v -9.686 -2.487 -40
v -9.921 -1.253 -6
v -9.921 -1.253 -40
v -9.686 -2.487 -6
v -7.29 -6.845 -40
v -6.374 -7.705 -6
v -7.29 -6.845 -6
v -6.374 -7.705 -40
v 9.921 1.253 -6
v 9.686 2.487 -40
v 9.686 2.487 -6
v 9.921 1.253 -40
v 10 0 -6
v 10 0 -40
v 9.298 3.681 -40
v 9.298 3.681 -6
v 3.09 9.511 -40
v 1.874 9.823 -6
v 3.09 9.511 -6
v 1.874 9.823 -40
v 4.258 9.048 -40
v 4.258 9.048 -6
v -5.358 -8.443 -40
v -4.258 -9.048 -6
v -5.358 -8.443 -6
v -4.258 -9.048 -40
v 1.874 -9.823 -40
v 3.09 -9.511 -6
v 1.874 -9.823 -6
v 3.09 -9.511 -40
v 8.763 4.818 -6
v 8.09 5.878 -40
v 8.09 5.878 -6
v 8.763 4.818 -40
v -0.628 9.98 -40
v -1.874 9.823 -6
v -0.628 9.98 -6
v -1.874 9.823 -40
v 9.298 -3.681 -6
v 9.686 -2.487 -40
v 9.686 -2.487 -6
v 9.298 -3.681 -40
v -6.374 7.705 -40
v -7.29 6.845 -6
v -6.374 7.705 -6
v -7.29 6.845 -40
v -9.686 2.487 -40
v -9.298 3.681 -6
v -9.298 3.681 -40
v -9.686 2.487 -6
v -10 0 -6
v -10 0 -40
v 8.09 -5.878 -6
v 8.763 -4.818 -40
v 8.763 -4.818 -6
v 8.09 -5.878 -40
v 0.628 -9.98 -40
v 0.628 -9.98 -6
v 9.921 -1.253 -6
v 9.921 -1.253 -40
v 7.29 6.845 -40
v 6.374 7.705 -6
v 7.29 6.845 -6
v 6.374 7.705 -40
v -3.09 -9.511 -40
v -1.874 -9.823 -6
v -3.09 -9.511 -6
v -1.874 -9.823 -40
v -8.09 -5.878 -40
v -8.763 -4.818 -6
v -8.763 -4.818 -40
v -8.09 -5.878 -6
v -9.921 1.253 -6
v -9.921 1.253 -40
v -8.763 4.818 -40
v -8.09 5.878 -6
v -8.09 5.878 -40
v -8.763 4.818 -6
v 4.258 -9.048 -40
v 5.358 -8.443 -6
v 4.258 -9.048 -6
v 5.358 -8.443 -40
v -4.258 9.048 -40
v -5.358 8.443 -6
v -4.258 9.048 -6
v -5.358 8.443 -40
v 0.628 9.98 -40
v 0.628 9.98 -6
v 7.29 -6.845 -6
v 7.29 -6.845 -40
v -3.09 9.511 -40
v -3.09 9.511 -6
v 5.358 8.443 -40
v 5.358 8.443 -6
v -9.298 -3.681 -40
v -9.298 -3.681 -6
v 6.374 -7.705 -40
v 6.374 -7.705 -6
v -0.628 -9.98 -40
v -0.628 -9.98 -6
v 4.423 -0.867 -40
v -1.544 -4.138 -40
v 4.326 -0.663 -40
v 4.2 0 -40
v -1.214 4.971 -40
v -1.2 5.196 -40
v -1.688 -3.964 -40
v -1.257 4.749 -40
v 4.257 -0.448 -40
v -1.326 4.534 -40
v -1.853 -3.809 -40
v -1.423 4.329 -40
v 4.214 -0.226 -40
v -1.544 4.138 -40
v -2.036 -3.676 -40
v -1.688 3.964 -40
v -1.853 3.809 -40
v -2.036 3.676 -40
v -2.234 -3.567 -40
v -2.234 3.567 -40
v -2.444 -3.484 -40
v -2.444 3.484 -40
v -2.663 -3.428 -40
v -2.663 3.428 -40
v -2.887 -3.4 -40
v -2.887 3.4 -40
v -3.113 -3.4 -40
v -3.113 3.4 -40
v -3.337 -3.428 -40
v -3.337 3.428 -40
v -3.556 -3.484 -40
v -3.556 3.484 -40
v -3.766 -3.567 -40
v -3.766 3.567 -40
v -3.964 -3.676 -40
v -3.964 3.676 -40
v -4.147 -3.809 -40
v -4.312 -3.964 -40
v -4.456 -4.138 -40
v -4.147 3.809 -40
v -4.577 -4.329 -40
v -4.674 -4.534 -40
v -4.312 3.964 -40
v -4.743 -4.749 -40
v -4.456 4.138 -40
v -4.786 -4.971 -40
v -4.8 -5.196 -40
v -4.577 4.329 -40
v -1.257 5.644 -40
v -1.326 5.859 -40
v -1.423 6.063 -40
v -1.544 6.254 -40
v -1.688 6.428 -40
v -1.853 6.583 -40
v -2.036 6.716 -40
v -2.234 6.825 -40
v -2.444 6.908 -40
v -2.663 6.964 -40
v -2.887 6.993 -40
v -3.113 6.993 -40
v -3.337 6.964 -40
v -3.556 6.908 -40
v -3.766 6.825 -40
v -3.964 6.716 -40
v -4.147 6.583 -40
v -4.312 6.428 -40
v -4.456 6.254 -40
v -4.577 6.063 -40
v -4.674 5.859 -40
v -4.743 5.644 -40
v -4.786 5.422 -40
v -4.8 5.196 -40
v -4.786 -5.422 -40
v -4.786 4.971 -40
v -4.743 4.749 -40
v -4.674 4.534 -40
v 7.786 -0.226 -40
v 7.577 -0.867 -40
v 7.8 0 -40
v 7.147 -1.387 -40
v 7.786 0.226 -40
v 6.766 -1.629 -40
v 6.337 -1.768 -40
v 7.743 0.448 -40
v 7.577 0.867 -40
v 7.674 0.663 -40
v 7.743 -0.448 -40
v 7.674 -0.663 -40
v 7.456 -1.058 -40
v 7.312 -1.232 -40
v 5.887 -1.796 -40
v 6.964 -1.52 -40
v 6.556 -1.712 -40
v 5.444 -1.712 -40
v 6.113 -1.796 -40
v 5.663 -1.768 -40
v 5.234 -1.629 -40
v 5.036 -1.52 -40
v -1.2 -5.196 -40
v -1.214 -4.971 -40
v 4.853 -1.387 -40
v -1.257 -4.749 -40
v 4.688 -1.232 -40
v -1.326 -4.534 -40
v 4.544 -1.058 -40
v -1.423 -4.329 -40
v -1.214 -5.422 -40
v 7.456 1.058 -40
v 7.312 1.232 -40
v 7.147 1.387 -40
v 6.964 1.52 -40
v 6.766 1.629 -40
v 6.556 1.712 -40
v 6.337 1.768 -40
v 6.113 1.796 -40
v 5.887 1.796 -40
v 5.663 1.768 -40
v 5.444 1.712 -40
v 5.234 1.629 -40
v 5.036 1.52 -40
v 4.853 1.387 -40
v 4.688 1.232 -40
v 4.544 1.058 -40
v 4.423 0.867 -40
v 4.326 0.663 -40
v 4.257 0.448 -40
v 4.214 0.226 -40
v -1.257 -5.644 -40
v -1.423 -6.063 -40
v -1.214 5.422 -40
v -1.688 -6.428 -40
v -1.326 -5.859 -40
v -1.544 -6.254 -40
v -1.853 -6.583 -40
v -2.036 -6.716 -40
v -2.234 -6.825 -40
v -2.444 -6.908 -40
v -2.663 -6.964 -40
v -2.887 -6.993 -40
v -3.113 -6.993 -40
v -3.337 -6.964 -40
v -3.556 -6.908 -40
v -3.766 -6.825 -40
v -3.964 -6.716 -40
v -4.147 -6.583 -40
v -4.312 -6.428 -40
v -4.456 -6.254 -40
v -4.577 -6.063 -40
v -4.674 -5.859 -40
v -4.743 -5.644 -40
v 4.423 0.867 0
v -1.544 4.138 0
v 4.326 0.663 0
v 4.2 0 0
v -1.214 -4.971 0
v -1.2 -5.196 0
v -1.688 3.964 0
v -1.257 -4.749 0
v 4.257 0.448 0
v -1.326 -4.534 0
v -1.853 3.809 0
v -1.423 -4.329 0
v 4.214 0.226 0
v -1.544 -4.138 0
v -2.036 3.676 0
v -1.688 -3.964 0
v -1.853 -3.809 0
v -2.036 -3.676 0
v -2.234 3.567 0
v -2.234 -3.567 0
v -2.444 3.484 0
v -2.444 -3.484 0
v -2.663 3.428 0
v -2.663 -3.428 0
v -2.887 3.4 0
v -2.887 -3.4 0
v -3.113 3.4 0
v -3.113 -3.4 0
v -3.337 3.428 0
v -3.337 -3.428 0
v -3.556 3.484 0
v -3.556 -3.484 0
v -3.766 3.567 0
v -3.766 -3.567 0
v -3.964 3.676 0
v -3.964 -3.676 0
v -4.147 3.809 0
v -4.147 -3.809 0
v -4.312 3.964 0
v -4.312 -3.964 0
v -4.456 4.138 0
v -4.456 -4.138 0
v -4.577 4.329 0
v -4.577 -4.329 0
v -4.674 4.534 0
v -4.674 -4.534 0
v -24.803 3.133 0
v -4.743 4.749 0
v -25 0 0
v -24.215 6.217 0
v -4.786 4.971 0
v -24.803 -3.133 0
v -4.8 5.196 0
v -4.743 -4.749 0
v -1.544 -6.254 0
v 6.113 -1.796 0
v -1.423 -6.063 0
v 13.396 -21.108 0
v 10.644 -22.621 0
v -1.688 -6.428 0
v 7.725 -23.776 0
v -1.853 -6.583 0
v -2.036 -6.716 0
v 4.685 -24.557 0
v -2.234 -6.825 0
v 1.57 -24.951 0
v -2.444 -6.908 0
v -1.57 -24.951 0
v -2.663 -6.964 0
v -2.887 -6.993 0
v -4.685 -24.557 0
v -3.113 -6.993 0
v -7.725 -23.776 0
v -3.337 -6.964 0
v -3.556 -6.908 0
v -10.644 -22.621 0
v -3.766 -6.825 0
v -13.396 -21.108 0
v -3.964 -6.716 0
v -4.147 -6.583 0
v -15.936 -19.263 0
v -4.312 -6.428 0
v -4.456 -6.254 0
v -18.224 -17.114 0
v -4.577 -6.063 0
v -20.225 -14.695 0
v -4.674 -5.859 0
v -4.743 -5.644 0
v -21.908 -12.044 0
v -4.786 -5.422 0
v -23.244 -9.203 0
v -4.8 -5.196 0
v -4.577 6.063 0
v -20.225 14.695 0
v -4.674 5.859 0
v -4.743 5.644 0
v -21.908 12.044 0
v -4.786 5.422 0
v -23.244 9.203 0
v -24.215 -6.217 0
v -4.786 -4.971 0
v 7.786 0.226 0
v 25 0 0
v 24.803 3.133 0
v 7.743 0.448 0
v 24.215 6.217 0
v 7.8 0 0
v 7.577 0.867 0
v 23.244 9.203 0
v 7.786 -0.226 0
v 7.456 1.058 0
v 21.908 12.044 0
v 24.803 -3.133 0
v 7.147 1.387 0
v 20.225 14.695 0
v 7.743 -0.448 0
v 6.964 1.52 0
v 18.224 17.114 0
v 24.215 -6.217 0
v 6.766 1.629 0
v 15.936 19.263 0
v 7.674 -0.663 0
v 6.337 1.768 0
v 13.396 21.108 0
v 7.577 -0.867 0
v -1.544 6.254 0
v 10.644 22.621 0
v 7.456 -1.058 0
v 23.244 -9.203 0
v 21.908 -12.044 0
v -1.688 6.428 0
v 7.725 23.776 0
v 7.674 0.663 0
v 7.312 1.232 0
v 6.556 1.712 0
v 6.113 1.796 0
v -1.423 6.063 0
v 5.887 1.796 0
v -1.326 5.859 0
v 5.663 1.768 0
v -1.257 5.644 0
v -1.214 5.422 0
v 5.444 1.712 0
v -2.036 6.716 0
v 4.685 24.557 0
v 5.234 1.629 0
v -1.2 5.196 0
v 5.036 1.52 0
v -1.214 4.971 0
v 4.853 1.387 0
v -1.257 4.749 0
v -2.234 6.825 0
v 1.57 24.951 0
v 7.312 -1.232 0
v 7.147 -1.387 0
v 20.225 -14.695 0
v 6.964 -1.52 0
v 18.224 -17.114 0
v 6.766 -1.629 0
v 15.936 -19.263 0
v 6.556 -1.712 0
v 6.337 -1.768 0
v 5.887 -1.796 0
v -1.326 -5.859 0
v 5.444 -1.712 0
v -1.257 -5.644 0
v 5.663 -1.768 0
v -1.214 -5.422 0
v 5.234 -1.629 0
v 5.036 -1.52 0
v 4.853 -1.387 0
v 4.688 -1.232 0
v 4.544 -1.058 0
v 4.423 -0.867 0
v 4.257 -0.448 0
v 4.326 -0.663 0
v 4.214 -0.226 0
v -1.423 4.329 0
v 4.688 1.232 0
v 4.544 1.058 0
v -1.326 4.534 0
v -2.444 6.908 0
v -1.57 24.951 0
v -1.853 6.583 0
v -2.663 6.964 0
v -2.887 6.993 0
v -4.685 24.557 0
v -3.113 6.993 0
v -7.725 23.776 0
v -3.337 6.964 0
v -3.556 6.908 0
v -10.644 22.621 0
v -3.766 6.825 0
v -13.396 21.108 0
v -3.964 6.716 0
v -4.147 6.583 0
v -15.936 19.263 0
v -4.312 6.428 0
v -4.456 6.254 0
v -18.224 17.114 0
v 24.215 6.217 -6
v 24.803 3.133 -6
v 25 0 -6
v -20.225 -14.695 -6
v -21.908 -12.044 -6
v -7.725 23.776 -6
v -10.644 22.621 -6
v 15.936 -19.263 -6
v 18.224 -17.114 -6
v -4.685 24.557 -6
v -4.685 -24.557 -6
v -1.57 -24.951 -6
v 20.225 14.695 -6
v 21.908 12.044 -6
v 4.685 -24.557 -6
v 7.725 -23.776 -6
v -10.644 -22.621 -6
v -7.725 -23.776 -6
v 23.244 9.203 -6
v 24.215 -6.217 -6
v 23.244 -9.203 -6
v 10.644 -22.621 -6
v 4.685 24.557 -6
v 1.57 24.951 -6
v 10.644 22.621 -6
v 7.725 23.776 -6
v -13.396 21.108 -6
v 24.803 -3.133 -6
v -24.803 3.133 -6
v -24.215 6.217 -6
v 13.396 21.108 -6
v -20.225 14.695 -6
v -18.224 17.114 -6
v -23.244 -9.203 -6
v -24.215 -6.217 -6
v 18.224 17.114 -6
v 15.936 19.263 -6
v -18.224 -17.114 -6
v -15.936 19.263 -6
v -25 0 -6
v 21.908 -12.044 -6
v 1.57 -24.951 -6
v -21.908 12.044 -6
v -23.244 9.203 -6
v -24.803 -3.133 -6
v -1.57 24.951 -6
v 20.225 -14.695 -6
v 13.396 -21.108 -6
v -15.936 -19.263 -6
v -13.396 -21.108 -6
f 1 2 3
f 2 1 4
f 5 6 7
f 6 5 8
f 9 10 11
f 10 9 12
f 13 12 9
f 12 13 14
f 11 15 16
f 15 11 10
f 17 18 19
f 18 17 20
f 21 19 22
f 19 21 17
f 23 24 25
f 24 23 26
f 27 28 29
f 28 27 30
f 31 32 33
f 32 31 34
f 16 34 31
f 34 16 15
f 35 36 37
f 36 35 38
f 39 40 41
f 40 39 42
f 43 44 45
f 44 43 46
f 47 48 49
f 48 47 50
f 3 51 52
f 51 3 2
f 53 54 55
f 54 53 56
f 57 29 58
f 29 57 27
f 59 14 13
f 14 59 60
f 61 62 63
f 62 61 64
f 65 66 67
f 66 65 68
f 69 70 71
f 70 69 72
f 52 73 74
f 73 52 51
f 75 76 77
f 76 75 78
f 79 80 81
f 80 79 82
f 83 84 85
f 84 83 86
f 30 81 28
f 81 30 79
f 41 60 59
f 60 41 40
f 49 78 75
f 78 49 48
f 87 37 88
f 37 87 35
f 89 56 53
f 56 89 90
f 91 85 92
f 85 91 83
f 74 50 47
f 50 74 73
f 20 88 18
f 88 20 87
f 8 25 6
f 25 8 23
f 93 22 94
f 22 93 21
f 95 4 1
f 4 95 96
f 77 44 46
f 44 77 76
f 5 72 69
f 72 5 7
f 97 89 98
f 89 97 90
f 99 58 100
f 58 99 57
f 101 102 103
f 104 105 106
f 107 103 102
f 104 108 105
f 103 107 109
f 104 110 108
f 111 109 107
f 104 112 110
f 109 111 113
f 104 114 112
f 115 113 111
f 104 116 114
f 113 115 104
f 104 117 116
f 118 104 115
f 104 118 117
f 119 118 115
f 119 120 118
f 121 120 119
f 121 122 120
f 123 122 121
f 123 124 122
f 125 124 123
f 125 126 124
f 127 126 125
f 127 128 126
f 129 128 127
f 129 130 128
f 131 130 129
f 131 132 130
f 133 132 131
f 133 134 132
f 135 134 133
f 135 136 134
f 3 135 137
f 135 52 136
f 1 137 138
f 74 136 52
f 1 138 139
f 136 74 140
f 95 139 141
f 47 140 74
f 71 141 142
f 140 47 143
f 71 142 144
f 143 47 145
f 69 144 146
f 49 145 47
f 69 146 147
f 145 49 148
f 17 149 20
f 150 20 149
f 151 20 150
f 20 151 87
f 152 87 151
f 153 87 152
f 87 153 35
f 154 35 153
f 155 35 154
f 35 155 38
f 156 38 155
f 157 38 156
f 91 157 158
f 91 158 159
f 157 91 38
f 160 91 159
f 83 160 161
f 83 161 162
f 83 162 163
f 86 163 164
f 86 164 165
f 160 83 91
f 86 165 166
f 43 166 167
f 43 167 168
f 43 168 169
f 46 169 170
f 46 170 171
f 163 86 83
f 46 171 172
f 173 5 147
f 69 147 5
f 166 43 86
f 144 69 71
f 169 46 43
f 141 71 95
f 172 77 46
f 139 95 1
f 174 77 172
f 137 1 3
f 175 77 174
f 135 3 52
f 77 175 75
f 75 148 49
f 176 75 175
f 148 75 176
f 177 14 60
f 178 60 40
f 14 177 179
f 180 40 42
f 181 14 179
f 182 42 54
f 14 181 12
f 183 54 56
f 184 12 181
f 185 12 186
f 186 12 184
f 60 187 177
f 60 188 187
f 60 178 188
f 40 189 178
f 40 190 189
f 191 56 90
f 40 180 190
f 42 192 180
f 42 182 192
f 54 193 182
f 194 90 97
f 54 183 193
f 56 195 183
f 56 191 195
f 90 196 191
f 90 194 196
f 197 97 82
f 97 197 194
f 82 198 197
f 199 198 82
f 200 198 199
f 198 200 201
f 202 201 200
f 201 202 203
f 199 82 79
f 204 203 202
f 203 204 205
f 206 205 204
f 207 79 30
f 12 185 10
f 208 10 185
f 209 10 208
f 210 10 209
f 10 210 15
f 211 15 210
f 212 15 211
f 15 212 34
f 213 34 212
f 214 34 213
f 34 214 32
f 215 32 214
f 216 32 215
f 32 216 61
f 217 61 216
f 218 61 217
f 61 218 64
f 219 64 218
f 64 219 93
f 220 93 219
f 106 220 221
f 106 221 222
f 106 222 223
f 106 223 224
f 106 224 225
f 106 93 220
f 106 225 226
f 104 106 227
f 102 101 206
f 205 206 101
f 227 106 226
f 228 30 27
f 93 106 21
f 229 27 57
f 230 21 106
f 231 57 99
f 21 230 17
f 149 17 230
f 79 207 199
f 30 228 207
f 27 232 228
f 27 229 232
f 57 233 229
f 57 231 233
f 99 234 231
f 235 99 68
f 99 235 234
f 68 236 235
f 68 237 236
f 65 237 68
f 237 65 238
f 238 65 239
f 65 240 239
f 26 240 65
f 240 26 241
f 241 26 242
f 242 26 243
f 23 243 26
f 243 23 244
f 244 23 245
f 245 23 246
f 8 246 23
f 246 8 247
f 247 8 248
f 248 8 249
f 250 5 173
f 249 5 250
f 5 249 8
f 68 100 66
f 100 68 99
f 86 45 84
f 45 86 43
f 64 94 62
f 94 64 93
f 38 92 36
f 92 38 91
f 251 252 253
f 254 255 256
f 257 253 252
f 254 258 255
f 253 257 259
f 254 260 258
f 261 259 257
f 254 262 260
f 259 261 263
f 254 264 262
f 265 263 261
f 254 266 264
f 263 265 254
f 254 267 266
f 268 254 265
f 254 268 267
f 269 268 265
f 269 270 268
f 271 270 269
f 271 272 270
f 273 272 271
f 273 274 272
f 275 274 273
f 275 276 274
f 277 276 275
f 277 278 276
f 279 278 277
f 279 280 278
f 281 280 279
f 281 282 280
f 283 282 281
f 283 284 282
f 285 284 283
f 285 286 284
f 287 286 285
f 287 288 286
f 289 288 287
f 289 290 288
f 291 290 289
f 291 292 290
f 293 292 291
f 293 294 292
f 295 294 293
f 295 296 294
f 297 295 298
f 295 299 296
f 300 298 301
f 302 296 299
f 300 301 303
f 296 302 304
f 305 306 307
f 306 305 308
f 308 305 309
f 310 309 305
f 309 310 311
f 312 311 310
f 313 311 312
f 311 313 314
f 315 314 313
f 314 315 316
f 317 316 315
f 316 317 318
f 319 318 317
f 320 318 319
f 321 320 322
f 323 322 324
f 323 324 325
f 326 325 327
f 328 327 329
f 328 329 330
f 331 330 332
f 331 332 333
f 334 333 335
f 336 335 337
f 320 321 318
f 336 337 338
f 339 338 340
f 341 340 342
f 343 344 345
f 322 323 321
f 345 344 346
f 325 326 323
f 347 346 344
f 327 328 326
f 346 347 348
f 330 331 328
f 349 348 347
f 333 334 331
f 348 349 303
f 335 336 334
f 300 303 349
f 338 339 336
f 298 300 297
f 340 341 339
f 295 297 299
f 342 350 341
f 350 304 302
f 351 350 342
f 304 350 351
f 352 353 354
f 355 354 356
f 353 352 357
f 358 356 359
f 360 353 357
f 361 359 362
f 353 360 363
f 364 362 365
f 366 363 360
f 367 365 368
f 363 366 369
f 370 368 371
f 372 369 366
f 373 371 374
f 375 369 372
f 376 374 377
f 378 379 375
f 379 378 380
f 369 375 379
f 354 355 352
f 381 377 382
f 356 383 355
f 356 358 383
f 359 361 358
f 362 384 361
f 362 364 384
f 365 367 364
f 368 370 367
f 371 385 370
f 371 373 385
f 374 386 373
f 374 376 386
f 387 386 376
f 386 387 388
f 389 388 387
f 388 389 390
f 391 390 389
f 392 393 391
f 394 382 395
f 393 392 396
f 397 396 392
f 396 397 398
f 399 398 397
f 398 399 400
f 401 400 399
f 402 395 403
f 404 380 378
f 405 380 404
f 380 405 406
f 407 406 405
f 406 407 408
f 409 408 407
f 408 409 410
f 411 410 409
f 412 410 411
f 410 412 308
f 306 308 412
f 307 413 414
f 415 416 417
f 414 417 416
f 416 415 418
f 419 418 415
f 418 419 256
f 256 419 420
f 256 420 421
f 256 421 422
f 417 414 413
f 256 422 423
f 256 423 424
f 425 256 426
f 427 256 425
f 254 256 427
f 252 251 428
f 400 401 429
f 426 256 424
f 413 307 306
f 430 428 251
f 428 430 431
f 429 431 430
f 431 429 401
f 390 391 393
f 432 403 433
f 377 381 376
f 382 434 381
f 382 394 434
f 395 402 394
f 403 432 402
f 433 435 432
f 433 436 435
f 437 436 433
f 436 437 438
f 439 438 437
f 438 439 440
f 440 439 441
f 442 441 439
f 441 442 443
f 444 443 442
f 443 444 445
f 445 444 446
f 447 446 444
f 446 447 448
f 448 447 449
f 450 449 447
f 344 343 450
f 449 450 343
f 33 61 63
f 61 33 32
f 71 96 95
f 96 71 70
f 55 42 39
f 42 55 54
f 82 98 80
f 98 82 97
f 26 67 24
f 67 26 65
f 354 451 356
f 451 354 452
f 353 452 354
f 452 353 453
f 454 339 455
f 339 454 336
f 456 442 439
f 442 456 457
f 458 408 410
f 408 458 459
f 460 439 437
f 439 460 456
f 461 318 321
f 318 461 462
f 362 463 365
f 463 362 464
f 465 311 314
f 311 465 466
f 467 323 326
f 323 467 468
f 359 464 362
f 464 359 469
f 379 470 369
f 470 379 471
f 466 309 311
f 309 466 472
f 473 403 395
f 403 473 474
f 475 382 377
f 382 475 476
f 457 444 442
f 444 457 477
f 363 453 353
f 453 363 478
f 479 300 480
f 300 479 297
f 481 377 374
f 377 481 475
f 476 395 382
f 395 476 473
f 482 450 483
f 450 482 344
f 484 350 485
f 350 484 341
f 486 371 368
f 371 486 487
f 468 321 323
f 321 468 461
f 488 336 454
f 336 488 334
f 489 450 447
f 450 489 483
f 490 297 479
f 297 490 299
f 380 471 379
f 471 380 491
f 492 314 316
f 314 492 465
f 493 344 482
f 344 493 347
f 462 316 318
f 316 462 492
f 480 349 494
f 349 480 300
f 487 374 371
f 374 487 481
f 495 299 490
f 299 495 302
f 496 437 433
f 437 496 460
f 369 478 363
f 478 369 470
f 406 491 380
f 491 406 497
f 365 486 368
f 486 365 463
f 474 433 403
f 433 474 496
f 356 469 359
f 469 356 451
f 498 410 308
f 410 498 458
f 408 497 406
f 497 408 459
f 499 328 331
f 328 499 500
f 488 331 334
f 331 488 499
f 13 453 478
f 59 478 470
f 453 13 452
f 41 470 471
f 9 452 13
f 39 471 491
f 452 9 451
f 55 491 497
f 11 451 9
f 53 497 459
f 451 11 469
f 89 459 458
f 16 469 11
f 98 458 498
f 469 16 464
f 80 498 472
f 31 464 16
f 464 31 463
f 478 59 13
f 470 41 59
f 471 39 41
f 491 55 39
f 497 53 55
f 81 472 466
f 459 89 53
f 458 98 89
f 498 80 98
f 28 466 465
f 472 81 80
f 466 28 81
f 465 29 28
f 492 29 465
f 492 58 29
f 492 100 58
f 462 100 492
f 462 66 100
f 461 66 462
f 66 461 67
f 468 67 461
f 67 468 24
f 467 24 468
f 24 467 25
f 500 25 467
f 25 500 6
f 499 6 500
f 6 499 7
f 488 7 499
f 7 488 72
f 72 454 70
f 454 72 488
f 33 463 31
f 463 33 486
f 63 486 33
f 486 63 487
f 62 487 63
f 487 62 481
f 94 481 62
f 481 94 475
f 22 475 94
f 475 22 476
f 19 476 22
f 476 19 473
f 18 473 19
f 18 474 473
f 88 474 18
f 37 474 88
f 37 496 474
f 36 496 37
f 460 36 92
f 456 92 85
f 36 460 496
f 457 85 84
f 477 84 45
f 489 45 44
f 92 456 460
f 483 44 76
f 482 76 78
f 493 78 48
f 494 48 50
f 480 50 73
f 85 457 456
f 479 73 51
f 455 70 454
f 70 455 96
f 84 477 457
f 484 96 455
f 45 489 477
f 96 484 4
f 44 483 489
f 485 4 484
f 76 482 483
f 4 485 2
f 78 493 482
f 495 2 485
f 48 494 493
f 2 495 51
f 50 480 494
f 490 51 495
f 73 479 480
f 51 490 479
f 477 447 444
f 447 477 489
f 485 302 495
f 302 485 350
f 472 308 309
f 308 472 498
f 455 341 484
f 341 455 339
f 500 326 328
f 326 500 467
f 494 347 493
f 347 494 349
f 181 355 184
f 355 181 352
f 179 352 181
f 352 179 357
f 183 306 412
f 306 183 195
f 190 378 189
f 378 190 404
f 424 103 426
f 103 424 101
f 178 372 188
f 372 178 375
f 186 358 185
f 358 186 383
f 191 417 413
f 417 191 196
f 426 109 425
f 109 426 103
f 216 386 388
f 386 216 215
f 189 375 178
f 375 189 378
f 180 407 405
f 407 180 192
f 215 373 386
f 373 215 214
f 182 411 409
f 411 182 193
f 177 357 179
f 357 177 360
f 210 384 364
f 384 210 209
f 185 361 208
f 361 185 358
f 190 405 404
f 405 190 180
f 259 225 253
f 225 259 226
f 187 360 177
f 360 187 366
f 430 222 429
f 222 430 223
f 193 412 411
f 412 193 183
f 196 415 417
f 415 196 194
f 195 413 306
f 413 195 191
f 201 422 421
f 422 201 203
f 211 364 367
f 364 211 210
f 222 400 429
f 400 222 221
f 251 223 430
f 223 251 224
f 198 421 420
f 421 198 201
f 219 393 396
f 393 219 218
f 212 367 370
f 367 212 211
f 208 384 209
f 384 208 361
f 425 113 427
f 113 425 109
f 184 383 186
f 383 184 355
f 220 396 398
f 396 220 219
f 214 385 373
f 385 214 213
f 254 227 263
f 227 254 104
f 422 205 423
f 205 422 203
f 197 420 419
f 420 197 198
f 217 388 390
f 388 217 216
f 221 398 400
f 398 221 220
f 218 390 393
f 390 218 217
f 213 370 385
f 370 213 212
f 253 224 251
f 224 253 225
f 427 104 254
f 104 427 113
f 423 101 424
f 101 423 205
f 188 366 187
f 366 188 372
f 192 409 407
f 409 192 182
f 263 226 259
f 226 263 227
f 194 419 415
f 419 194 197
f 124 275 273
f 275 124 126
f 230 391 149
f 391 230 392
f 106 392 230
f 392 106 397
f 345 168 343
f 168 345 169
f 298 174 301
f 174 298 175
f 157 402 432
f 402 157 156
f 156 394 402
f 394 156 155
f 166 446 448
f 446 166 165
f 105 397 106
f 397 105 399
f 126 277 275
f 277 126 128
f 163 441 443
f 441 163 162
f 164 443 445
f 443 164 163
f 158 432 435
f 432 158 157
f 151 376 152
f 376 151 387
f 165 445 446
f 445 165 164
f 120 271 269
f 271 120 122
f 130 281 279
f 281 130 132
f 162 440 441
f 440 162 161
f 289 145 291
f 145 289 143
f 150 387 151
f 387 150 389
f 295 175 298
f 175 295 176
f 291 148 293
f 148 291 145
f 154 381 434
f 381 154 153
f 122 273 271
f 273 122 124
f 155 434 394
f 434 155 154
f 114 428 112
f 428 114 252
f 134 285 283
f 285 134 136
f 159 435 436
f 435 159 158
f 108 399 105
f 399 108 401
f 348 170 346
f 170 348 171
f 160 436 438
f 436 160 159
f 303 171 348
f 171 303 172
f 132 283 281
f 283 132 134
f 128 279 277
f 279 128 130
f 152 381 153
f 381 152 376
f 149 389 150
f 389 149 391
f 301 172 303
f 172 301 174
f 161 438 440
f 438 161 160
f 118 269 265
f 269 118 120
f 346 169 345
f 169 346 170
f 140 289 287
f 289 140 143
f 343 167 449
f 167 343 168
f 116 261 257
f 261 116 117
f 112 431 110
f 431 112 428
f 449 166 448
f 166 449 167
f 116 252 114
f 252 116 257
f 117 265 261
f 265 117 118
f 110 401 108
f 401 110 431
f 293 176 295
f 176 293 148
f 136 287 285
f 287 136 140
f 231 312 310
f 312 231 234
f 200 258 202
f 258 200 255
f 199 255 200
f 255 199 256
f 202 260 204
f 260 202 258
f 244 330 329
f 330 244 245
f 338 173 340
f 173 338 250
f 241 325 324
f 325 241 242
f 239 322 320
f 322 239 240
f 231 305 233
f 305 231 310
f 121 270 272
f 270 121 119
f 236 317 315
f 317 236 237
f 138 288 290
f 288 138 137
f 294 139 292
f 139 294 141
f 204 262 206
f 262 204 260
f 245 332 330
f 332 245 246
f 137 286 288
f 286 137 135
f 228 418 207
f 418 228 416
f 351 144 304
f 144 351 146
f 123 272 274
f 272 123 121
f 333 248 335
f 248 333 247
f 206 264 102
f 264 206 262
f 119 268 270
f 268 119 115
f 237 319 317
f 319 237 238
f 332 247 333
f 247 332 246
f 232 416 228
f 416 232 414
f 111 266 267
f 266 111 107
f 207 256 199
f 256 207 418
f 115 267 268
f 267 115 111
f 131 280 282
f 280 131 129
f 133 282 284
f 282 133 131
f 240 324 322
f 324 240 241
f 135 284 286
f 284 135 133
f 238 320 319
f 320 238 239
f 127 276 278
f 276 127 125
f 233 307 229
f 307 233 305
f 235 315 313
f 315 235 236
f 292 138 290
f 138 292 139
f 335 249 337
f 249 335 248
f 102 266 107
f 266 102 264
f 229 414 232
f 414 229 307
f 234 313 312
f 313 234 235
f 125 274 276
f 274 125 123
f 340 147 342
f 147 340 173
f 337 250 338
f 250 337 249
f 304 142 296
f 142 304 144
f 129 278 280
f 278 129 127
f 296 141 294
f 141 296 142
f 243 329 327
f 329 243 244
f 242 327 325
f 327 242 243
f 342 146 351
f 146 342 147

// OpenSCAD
$fn = 50;


difference() {
	union() {
		translate(v = [0, 0, -40.0000000000]) {
			cylinder(h = 40, r = 10.0000000000);
		}
		translate(v = [0, 0, -6.0000000000]) {
			cylinder(h = 6, r = 25.0000000000);
		}
	}
	union() {
		#translate(v = [6.0000000000, 0.0000000000, -40]) {
			cylinder(h = 40, r = 1.8000000000);
		}
		#translate(v = [-3.0000000000, 5.1961524227, -40]) {
			cylinder(h = 40, r = 1.8000000000);
		}
		#translate(v = [-3.0000000000, -5.1961524227, -40]) {
			cylinder(h = 40, r = 1.8000000000);
		}
	}
}
